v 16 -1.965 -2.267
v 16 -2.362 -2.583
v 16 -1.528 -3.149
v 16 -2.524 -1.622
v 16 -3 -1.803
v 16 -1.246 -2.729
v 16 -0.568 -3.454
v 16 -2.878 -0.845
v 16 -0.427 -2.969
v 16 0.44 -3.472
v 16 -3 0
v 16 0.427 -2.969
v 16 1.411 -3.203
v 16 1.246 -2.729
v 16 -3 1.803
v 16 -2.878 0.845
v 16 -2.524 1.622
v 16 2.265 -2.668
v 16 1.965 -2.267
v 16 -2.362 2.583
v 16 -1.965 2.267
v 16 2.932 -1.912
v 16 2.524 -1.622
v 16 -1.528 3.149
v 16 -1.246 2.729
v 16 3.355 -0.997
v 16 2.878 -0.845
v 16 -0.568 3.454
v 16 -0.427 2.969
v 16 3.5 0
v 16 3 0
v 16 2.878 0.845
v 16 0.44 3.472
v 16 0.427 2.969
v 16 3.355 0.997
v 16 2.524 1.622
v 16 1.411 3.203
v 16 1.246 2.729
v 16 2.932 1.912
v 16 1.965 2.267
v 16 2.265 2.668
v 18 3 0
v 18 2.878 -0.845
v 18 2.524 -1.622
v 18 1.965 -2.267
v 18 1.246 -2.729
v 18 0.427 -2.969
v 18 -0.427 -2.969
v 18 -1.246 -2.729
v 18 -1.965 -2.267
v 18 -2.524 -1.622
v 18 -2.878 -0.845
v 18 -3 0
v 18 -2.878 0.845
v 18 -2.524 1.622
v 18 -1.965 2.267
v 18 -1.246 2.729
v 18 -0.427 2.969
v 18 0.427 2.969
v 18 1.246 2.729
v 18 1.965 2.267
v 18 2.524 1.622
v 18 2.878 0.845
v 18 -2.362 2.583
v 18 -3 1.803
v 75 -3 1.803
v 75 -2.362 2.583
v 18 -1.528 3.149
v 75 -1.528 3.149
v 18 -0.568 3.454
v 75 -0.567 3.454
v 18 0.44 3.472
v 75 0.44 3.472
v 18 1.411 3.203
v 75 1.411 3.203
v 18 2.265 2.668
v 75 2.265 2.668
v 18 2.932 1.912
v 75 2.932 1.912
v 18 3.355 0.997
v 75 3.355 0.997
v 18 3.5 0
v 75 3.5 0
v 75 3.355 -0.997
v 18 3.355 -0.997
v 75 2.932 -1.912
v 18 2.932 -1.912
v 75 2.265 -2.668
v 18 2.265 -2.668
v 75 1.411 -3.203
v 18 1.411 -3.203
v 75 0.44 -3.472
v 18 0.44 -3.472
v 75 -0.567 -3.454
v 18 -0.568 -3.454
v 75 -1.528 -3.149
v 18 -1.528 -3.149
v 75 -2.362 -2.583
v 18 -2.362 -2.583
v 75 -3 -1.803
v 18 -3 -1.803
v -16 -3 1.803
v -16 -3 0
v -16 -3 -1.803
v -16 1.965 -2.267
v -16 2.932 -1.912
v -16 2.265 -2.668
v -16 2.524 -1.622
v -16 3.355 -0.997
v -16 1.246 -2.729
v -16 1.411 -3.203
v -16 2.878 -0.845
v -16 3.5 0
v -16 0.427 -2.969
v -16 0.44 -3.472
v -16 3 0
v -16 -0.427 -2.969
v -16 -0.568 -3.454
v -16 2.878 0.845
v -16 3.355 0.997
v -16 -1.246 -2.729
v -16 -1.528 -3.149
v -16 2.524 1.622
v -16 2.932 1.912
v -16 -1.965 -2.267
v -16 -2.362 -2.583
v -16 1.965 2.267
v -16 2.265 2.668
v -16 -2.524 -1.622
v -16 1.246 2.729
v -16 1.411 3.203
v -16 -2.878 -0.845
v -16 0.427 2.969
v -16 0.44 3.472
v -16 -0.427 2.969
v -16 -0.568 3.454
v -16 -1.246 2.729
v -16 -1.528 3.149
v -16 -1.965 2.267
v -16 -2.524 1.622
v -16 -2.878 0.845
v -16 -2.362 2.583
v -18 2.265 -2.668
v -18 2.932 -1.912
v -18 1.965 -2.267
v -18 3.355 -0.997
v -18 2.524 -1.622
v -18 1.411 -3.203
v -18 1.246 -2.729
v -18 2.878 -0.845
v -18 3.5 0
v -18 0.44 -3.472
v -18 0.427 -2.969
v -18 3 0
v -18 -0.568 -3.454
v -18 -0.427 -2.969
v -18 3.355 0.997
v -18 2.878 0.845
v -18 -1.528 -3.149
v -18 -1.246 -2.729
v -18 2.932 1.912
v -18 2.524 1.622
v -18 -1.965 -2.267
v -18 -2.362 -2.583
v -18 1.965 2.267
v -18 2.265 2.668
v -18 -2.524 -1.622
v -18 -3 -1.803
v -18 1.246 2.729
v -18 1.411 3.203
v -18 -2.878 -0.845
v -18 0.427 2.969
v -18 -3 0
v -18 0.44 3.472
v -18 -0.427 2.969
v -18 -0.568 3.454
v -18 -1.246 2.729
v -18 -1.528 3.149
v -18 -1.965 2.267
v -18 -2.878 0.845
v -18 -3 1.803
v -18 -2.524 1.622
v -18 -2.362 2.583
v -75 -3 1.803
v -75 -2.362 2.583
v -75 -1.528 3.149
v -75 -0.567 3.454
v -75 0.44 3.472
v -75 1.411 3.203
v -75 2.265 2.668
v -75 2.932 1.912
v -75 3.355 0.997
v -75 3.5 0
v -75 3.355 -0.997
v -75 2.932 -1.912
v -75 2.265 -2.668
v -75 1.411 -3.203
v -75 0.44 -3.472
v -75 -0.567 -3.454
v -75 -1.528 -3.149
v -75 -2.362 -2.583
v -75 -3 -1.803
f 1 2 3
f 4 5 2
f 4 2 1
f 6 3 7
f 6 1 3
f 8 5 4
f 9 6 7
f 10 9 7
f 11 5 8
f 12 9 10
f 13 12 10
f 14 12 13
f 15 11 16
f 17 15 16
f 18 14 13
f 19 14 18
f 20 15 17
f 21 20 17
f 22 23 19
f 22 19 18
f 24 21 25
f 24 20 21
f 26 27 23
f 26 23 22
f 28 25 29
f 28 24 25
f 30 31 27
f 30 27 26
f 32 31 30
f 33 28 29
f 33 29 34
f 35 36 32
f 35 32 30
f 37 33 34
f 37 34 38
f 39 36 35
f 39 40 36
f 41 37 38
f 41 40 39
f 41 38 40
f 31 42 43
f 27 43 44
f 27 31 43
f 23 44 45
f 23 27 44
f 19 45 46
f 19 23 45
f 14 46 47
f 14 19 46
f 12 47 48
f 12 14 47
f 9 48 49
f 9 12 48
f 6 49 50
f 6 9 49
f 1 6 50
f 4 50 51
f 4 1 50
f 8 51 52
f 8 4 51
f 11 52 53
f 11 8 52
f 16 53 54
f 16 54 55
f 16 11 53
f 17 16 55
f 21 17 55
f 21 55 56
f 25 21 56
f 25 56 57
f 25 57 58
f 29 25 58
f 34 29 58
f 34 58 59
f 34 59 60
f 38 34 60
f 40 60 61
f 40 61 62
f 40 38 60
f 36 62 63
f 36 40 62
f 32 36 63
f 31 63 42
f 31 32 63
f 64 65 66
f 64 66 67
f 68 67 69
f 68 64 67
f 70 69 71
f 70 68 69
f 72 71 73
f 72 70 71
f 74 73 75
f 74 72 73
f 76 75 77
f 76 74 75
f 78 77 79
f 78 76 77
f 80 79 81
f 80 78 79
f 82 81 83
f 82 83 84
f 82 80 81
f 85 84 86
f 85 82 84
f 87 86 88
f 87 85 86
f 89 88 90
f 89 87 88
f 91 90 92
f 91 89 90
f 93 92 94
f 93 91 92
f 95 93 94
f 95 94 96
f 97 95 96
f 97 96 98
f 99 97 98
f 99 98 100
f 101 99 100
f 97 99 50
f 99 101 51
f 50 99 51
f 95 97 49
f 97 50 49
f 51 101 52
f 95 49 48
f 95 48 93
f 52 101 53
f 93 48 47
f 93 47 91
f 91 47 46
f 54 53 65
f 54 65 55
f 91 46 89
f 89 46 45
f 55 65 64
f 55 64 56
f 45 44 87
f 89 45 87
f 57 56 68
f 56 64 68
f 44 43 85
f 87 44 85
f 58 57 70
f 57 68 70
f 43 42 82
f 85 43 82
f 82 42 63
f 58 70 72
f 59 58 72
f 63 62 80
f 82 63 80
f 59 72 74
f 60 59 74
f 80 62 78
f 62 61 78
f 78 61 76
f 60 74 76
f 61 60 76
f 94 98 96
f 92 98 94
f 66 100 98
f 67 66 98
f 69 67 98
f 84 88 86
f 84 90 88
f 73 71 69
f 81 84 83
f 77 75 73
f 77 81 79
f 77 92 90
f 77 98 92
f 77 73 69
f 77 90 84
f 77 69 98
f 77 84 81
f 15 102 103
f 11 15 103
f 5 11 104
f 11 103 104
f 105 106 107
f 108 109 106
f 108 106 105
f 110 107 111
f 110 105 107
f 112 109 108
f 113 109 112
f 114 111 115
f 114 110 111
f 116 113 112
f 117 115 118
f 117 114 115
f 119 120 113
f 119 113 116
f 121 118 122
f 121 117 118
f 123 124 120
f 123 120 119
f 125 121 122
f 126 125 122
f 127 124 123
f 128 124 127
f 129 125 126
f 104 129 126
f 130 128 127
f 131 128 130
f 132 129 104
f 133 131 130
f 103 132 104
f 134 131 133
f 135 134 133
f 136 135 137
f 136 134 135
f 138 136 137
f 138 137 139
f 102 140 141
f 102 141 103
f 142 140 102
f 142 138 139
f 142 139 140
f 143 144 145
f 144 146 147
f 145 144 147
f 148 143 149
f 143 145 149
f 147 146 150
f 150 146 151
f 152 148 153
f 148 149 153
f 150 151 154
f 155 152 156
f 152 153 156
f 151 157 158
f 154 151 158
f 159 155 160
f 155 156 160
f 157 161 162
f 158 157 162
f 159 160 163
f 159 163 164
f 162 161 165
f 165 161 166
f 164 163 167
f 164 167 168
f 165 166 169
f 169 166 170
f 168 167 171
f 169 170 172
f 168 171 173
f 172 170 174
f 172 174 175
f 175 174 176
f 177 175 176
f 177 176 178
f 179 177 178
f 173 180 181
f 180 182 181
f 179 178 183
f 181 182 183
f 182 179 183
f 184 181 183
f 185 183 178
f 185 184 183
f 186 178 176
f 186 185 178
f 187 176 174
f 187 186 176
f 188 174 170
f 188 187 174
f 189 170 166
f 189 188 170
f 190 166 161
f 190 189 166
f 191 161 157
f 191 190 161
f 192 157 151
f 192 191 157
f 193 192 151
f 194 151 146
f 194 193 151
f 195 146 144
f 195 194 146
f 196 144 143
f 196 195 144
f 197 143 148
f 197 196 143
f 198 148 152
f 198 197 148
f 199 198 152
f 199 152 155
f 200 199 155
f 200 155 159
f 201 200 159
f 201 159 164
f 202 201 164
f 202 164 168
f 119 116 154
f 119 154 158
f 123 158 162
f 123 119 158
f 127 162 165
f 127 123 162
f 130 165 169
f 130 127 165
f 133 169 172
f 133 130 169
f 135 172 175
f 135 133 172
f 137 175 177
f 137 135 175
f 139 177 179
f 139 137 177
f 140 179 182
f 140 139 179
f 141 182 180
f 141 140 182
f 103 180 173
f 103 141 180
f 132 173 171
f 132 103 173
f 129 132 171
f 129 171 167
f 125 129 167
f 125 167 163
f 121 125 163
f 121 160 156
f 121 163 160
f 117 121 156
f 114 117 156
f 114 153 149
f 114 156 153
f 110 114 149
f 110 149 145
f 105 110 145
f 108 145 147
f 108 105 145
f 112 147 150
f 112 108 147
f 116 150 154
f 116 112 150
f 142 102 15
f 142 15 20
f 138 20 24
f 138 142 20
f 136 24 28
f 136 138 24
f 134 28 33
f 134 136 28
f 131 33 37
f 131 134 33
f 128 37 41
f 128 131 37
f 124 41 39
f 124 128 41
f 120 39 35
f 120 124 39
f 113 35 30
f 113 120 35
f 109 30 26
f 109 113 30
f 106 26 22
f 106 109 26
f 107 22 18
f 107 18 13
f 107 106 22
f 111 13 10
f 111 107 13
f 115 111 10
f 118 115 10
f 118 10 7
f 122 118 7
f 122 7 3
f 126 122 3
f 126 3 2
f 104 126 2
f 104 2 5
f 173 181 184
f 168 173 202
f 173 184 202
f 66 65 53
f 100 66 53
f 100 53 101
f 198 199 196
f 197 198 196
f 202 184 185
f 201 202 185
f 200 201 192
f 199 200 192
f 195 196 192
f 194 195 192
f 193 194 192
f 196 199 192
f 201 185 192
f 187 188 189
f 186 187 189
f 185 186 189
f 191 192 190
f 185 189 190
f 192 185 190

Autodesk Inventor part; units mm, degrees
ref_plane "XZ Plane" through (0, 0, 0) normal (0, 1, 0) x (-1, 0, 0)
ref_plane "XY Plane" through (0, 0, 0) normal (0, 0, 1) x (1, 0, 0)
sketch "Sketch1" plane through (0, 0, 0) normal (1, 0, 0) x (0, 1, 0)
  circle A0 centre (0, 0) radius 3.5
  circle A1 centre (0, 0) radius 3
  line L0 (-3, 1.8028) -> (-3, -1.8028)
  dimension "d0" = 7
  dimension "d3" = 0.5
  dimension "d9" = 3
extrude "Extrusion1" add sketch "Sketch1" along normal mid plane 150 contours A1 | A0 L0 picked at (3.3009, 0.2732)
ref_plane "Work Plane1" through (16, 0, 0) normal (1, 0, 0) x (0, 1, 0)
extrude "Extrusion3" cut sketch "Sketch1" along normal blind 2 from surface at 16
mirror "Mirror1" about plane through (0, 0, 0) normal (1, 0, 0) of "Extrusion3"
properties part number "Linear Rod"
